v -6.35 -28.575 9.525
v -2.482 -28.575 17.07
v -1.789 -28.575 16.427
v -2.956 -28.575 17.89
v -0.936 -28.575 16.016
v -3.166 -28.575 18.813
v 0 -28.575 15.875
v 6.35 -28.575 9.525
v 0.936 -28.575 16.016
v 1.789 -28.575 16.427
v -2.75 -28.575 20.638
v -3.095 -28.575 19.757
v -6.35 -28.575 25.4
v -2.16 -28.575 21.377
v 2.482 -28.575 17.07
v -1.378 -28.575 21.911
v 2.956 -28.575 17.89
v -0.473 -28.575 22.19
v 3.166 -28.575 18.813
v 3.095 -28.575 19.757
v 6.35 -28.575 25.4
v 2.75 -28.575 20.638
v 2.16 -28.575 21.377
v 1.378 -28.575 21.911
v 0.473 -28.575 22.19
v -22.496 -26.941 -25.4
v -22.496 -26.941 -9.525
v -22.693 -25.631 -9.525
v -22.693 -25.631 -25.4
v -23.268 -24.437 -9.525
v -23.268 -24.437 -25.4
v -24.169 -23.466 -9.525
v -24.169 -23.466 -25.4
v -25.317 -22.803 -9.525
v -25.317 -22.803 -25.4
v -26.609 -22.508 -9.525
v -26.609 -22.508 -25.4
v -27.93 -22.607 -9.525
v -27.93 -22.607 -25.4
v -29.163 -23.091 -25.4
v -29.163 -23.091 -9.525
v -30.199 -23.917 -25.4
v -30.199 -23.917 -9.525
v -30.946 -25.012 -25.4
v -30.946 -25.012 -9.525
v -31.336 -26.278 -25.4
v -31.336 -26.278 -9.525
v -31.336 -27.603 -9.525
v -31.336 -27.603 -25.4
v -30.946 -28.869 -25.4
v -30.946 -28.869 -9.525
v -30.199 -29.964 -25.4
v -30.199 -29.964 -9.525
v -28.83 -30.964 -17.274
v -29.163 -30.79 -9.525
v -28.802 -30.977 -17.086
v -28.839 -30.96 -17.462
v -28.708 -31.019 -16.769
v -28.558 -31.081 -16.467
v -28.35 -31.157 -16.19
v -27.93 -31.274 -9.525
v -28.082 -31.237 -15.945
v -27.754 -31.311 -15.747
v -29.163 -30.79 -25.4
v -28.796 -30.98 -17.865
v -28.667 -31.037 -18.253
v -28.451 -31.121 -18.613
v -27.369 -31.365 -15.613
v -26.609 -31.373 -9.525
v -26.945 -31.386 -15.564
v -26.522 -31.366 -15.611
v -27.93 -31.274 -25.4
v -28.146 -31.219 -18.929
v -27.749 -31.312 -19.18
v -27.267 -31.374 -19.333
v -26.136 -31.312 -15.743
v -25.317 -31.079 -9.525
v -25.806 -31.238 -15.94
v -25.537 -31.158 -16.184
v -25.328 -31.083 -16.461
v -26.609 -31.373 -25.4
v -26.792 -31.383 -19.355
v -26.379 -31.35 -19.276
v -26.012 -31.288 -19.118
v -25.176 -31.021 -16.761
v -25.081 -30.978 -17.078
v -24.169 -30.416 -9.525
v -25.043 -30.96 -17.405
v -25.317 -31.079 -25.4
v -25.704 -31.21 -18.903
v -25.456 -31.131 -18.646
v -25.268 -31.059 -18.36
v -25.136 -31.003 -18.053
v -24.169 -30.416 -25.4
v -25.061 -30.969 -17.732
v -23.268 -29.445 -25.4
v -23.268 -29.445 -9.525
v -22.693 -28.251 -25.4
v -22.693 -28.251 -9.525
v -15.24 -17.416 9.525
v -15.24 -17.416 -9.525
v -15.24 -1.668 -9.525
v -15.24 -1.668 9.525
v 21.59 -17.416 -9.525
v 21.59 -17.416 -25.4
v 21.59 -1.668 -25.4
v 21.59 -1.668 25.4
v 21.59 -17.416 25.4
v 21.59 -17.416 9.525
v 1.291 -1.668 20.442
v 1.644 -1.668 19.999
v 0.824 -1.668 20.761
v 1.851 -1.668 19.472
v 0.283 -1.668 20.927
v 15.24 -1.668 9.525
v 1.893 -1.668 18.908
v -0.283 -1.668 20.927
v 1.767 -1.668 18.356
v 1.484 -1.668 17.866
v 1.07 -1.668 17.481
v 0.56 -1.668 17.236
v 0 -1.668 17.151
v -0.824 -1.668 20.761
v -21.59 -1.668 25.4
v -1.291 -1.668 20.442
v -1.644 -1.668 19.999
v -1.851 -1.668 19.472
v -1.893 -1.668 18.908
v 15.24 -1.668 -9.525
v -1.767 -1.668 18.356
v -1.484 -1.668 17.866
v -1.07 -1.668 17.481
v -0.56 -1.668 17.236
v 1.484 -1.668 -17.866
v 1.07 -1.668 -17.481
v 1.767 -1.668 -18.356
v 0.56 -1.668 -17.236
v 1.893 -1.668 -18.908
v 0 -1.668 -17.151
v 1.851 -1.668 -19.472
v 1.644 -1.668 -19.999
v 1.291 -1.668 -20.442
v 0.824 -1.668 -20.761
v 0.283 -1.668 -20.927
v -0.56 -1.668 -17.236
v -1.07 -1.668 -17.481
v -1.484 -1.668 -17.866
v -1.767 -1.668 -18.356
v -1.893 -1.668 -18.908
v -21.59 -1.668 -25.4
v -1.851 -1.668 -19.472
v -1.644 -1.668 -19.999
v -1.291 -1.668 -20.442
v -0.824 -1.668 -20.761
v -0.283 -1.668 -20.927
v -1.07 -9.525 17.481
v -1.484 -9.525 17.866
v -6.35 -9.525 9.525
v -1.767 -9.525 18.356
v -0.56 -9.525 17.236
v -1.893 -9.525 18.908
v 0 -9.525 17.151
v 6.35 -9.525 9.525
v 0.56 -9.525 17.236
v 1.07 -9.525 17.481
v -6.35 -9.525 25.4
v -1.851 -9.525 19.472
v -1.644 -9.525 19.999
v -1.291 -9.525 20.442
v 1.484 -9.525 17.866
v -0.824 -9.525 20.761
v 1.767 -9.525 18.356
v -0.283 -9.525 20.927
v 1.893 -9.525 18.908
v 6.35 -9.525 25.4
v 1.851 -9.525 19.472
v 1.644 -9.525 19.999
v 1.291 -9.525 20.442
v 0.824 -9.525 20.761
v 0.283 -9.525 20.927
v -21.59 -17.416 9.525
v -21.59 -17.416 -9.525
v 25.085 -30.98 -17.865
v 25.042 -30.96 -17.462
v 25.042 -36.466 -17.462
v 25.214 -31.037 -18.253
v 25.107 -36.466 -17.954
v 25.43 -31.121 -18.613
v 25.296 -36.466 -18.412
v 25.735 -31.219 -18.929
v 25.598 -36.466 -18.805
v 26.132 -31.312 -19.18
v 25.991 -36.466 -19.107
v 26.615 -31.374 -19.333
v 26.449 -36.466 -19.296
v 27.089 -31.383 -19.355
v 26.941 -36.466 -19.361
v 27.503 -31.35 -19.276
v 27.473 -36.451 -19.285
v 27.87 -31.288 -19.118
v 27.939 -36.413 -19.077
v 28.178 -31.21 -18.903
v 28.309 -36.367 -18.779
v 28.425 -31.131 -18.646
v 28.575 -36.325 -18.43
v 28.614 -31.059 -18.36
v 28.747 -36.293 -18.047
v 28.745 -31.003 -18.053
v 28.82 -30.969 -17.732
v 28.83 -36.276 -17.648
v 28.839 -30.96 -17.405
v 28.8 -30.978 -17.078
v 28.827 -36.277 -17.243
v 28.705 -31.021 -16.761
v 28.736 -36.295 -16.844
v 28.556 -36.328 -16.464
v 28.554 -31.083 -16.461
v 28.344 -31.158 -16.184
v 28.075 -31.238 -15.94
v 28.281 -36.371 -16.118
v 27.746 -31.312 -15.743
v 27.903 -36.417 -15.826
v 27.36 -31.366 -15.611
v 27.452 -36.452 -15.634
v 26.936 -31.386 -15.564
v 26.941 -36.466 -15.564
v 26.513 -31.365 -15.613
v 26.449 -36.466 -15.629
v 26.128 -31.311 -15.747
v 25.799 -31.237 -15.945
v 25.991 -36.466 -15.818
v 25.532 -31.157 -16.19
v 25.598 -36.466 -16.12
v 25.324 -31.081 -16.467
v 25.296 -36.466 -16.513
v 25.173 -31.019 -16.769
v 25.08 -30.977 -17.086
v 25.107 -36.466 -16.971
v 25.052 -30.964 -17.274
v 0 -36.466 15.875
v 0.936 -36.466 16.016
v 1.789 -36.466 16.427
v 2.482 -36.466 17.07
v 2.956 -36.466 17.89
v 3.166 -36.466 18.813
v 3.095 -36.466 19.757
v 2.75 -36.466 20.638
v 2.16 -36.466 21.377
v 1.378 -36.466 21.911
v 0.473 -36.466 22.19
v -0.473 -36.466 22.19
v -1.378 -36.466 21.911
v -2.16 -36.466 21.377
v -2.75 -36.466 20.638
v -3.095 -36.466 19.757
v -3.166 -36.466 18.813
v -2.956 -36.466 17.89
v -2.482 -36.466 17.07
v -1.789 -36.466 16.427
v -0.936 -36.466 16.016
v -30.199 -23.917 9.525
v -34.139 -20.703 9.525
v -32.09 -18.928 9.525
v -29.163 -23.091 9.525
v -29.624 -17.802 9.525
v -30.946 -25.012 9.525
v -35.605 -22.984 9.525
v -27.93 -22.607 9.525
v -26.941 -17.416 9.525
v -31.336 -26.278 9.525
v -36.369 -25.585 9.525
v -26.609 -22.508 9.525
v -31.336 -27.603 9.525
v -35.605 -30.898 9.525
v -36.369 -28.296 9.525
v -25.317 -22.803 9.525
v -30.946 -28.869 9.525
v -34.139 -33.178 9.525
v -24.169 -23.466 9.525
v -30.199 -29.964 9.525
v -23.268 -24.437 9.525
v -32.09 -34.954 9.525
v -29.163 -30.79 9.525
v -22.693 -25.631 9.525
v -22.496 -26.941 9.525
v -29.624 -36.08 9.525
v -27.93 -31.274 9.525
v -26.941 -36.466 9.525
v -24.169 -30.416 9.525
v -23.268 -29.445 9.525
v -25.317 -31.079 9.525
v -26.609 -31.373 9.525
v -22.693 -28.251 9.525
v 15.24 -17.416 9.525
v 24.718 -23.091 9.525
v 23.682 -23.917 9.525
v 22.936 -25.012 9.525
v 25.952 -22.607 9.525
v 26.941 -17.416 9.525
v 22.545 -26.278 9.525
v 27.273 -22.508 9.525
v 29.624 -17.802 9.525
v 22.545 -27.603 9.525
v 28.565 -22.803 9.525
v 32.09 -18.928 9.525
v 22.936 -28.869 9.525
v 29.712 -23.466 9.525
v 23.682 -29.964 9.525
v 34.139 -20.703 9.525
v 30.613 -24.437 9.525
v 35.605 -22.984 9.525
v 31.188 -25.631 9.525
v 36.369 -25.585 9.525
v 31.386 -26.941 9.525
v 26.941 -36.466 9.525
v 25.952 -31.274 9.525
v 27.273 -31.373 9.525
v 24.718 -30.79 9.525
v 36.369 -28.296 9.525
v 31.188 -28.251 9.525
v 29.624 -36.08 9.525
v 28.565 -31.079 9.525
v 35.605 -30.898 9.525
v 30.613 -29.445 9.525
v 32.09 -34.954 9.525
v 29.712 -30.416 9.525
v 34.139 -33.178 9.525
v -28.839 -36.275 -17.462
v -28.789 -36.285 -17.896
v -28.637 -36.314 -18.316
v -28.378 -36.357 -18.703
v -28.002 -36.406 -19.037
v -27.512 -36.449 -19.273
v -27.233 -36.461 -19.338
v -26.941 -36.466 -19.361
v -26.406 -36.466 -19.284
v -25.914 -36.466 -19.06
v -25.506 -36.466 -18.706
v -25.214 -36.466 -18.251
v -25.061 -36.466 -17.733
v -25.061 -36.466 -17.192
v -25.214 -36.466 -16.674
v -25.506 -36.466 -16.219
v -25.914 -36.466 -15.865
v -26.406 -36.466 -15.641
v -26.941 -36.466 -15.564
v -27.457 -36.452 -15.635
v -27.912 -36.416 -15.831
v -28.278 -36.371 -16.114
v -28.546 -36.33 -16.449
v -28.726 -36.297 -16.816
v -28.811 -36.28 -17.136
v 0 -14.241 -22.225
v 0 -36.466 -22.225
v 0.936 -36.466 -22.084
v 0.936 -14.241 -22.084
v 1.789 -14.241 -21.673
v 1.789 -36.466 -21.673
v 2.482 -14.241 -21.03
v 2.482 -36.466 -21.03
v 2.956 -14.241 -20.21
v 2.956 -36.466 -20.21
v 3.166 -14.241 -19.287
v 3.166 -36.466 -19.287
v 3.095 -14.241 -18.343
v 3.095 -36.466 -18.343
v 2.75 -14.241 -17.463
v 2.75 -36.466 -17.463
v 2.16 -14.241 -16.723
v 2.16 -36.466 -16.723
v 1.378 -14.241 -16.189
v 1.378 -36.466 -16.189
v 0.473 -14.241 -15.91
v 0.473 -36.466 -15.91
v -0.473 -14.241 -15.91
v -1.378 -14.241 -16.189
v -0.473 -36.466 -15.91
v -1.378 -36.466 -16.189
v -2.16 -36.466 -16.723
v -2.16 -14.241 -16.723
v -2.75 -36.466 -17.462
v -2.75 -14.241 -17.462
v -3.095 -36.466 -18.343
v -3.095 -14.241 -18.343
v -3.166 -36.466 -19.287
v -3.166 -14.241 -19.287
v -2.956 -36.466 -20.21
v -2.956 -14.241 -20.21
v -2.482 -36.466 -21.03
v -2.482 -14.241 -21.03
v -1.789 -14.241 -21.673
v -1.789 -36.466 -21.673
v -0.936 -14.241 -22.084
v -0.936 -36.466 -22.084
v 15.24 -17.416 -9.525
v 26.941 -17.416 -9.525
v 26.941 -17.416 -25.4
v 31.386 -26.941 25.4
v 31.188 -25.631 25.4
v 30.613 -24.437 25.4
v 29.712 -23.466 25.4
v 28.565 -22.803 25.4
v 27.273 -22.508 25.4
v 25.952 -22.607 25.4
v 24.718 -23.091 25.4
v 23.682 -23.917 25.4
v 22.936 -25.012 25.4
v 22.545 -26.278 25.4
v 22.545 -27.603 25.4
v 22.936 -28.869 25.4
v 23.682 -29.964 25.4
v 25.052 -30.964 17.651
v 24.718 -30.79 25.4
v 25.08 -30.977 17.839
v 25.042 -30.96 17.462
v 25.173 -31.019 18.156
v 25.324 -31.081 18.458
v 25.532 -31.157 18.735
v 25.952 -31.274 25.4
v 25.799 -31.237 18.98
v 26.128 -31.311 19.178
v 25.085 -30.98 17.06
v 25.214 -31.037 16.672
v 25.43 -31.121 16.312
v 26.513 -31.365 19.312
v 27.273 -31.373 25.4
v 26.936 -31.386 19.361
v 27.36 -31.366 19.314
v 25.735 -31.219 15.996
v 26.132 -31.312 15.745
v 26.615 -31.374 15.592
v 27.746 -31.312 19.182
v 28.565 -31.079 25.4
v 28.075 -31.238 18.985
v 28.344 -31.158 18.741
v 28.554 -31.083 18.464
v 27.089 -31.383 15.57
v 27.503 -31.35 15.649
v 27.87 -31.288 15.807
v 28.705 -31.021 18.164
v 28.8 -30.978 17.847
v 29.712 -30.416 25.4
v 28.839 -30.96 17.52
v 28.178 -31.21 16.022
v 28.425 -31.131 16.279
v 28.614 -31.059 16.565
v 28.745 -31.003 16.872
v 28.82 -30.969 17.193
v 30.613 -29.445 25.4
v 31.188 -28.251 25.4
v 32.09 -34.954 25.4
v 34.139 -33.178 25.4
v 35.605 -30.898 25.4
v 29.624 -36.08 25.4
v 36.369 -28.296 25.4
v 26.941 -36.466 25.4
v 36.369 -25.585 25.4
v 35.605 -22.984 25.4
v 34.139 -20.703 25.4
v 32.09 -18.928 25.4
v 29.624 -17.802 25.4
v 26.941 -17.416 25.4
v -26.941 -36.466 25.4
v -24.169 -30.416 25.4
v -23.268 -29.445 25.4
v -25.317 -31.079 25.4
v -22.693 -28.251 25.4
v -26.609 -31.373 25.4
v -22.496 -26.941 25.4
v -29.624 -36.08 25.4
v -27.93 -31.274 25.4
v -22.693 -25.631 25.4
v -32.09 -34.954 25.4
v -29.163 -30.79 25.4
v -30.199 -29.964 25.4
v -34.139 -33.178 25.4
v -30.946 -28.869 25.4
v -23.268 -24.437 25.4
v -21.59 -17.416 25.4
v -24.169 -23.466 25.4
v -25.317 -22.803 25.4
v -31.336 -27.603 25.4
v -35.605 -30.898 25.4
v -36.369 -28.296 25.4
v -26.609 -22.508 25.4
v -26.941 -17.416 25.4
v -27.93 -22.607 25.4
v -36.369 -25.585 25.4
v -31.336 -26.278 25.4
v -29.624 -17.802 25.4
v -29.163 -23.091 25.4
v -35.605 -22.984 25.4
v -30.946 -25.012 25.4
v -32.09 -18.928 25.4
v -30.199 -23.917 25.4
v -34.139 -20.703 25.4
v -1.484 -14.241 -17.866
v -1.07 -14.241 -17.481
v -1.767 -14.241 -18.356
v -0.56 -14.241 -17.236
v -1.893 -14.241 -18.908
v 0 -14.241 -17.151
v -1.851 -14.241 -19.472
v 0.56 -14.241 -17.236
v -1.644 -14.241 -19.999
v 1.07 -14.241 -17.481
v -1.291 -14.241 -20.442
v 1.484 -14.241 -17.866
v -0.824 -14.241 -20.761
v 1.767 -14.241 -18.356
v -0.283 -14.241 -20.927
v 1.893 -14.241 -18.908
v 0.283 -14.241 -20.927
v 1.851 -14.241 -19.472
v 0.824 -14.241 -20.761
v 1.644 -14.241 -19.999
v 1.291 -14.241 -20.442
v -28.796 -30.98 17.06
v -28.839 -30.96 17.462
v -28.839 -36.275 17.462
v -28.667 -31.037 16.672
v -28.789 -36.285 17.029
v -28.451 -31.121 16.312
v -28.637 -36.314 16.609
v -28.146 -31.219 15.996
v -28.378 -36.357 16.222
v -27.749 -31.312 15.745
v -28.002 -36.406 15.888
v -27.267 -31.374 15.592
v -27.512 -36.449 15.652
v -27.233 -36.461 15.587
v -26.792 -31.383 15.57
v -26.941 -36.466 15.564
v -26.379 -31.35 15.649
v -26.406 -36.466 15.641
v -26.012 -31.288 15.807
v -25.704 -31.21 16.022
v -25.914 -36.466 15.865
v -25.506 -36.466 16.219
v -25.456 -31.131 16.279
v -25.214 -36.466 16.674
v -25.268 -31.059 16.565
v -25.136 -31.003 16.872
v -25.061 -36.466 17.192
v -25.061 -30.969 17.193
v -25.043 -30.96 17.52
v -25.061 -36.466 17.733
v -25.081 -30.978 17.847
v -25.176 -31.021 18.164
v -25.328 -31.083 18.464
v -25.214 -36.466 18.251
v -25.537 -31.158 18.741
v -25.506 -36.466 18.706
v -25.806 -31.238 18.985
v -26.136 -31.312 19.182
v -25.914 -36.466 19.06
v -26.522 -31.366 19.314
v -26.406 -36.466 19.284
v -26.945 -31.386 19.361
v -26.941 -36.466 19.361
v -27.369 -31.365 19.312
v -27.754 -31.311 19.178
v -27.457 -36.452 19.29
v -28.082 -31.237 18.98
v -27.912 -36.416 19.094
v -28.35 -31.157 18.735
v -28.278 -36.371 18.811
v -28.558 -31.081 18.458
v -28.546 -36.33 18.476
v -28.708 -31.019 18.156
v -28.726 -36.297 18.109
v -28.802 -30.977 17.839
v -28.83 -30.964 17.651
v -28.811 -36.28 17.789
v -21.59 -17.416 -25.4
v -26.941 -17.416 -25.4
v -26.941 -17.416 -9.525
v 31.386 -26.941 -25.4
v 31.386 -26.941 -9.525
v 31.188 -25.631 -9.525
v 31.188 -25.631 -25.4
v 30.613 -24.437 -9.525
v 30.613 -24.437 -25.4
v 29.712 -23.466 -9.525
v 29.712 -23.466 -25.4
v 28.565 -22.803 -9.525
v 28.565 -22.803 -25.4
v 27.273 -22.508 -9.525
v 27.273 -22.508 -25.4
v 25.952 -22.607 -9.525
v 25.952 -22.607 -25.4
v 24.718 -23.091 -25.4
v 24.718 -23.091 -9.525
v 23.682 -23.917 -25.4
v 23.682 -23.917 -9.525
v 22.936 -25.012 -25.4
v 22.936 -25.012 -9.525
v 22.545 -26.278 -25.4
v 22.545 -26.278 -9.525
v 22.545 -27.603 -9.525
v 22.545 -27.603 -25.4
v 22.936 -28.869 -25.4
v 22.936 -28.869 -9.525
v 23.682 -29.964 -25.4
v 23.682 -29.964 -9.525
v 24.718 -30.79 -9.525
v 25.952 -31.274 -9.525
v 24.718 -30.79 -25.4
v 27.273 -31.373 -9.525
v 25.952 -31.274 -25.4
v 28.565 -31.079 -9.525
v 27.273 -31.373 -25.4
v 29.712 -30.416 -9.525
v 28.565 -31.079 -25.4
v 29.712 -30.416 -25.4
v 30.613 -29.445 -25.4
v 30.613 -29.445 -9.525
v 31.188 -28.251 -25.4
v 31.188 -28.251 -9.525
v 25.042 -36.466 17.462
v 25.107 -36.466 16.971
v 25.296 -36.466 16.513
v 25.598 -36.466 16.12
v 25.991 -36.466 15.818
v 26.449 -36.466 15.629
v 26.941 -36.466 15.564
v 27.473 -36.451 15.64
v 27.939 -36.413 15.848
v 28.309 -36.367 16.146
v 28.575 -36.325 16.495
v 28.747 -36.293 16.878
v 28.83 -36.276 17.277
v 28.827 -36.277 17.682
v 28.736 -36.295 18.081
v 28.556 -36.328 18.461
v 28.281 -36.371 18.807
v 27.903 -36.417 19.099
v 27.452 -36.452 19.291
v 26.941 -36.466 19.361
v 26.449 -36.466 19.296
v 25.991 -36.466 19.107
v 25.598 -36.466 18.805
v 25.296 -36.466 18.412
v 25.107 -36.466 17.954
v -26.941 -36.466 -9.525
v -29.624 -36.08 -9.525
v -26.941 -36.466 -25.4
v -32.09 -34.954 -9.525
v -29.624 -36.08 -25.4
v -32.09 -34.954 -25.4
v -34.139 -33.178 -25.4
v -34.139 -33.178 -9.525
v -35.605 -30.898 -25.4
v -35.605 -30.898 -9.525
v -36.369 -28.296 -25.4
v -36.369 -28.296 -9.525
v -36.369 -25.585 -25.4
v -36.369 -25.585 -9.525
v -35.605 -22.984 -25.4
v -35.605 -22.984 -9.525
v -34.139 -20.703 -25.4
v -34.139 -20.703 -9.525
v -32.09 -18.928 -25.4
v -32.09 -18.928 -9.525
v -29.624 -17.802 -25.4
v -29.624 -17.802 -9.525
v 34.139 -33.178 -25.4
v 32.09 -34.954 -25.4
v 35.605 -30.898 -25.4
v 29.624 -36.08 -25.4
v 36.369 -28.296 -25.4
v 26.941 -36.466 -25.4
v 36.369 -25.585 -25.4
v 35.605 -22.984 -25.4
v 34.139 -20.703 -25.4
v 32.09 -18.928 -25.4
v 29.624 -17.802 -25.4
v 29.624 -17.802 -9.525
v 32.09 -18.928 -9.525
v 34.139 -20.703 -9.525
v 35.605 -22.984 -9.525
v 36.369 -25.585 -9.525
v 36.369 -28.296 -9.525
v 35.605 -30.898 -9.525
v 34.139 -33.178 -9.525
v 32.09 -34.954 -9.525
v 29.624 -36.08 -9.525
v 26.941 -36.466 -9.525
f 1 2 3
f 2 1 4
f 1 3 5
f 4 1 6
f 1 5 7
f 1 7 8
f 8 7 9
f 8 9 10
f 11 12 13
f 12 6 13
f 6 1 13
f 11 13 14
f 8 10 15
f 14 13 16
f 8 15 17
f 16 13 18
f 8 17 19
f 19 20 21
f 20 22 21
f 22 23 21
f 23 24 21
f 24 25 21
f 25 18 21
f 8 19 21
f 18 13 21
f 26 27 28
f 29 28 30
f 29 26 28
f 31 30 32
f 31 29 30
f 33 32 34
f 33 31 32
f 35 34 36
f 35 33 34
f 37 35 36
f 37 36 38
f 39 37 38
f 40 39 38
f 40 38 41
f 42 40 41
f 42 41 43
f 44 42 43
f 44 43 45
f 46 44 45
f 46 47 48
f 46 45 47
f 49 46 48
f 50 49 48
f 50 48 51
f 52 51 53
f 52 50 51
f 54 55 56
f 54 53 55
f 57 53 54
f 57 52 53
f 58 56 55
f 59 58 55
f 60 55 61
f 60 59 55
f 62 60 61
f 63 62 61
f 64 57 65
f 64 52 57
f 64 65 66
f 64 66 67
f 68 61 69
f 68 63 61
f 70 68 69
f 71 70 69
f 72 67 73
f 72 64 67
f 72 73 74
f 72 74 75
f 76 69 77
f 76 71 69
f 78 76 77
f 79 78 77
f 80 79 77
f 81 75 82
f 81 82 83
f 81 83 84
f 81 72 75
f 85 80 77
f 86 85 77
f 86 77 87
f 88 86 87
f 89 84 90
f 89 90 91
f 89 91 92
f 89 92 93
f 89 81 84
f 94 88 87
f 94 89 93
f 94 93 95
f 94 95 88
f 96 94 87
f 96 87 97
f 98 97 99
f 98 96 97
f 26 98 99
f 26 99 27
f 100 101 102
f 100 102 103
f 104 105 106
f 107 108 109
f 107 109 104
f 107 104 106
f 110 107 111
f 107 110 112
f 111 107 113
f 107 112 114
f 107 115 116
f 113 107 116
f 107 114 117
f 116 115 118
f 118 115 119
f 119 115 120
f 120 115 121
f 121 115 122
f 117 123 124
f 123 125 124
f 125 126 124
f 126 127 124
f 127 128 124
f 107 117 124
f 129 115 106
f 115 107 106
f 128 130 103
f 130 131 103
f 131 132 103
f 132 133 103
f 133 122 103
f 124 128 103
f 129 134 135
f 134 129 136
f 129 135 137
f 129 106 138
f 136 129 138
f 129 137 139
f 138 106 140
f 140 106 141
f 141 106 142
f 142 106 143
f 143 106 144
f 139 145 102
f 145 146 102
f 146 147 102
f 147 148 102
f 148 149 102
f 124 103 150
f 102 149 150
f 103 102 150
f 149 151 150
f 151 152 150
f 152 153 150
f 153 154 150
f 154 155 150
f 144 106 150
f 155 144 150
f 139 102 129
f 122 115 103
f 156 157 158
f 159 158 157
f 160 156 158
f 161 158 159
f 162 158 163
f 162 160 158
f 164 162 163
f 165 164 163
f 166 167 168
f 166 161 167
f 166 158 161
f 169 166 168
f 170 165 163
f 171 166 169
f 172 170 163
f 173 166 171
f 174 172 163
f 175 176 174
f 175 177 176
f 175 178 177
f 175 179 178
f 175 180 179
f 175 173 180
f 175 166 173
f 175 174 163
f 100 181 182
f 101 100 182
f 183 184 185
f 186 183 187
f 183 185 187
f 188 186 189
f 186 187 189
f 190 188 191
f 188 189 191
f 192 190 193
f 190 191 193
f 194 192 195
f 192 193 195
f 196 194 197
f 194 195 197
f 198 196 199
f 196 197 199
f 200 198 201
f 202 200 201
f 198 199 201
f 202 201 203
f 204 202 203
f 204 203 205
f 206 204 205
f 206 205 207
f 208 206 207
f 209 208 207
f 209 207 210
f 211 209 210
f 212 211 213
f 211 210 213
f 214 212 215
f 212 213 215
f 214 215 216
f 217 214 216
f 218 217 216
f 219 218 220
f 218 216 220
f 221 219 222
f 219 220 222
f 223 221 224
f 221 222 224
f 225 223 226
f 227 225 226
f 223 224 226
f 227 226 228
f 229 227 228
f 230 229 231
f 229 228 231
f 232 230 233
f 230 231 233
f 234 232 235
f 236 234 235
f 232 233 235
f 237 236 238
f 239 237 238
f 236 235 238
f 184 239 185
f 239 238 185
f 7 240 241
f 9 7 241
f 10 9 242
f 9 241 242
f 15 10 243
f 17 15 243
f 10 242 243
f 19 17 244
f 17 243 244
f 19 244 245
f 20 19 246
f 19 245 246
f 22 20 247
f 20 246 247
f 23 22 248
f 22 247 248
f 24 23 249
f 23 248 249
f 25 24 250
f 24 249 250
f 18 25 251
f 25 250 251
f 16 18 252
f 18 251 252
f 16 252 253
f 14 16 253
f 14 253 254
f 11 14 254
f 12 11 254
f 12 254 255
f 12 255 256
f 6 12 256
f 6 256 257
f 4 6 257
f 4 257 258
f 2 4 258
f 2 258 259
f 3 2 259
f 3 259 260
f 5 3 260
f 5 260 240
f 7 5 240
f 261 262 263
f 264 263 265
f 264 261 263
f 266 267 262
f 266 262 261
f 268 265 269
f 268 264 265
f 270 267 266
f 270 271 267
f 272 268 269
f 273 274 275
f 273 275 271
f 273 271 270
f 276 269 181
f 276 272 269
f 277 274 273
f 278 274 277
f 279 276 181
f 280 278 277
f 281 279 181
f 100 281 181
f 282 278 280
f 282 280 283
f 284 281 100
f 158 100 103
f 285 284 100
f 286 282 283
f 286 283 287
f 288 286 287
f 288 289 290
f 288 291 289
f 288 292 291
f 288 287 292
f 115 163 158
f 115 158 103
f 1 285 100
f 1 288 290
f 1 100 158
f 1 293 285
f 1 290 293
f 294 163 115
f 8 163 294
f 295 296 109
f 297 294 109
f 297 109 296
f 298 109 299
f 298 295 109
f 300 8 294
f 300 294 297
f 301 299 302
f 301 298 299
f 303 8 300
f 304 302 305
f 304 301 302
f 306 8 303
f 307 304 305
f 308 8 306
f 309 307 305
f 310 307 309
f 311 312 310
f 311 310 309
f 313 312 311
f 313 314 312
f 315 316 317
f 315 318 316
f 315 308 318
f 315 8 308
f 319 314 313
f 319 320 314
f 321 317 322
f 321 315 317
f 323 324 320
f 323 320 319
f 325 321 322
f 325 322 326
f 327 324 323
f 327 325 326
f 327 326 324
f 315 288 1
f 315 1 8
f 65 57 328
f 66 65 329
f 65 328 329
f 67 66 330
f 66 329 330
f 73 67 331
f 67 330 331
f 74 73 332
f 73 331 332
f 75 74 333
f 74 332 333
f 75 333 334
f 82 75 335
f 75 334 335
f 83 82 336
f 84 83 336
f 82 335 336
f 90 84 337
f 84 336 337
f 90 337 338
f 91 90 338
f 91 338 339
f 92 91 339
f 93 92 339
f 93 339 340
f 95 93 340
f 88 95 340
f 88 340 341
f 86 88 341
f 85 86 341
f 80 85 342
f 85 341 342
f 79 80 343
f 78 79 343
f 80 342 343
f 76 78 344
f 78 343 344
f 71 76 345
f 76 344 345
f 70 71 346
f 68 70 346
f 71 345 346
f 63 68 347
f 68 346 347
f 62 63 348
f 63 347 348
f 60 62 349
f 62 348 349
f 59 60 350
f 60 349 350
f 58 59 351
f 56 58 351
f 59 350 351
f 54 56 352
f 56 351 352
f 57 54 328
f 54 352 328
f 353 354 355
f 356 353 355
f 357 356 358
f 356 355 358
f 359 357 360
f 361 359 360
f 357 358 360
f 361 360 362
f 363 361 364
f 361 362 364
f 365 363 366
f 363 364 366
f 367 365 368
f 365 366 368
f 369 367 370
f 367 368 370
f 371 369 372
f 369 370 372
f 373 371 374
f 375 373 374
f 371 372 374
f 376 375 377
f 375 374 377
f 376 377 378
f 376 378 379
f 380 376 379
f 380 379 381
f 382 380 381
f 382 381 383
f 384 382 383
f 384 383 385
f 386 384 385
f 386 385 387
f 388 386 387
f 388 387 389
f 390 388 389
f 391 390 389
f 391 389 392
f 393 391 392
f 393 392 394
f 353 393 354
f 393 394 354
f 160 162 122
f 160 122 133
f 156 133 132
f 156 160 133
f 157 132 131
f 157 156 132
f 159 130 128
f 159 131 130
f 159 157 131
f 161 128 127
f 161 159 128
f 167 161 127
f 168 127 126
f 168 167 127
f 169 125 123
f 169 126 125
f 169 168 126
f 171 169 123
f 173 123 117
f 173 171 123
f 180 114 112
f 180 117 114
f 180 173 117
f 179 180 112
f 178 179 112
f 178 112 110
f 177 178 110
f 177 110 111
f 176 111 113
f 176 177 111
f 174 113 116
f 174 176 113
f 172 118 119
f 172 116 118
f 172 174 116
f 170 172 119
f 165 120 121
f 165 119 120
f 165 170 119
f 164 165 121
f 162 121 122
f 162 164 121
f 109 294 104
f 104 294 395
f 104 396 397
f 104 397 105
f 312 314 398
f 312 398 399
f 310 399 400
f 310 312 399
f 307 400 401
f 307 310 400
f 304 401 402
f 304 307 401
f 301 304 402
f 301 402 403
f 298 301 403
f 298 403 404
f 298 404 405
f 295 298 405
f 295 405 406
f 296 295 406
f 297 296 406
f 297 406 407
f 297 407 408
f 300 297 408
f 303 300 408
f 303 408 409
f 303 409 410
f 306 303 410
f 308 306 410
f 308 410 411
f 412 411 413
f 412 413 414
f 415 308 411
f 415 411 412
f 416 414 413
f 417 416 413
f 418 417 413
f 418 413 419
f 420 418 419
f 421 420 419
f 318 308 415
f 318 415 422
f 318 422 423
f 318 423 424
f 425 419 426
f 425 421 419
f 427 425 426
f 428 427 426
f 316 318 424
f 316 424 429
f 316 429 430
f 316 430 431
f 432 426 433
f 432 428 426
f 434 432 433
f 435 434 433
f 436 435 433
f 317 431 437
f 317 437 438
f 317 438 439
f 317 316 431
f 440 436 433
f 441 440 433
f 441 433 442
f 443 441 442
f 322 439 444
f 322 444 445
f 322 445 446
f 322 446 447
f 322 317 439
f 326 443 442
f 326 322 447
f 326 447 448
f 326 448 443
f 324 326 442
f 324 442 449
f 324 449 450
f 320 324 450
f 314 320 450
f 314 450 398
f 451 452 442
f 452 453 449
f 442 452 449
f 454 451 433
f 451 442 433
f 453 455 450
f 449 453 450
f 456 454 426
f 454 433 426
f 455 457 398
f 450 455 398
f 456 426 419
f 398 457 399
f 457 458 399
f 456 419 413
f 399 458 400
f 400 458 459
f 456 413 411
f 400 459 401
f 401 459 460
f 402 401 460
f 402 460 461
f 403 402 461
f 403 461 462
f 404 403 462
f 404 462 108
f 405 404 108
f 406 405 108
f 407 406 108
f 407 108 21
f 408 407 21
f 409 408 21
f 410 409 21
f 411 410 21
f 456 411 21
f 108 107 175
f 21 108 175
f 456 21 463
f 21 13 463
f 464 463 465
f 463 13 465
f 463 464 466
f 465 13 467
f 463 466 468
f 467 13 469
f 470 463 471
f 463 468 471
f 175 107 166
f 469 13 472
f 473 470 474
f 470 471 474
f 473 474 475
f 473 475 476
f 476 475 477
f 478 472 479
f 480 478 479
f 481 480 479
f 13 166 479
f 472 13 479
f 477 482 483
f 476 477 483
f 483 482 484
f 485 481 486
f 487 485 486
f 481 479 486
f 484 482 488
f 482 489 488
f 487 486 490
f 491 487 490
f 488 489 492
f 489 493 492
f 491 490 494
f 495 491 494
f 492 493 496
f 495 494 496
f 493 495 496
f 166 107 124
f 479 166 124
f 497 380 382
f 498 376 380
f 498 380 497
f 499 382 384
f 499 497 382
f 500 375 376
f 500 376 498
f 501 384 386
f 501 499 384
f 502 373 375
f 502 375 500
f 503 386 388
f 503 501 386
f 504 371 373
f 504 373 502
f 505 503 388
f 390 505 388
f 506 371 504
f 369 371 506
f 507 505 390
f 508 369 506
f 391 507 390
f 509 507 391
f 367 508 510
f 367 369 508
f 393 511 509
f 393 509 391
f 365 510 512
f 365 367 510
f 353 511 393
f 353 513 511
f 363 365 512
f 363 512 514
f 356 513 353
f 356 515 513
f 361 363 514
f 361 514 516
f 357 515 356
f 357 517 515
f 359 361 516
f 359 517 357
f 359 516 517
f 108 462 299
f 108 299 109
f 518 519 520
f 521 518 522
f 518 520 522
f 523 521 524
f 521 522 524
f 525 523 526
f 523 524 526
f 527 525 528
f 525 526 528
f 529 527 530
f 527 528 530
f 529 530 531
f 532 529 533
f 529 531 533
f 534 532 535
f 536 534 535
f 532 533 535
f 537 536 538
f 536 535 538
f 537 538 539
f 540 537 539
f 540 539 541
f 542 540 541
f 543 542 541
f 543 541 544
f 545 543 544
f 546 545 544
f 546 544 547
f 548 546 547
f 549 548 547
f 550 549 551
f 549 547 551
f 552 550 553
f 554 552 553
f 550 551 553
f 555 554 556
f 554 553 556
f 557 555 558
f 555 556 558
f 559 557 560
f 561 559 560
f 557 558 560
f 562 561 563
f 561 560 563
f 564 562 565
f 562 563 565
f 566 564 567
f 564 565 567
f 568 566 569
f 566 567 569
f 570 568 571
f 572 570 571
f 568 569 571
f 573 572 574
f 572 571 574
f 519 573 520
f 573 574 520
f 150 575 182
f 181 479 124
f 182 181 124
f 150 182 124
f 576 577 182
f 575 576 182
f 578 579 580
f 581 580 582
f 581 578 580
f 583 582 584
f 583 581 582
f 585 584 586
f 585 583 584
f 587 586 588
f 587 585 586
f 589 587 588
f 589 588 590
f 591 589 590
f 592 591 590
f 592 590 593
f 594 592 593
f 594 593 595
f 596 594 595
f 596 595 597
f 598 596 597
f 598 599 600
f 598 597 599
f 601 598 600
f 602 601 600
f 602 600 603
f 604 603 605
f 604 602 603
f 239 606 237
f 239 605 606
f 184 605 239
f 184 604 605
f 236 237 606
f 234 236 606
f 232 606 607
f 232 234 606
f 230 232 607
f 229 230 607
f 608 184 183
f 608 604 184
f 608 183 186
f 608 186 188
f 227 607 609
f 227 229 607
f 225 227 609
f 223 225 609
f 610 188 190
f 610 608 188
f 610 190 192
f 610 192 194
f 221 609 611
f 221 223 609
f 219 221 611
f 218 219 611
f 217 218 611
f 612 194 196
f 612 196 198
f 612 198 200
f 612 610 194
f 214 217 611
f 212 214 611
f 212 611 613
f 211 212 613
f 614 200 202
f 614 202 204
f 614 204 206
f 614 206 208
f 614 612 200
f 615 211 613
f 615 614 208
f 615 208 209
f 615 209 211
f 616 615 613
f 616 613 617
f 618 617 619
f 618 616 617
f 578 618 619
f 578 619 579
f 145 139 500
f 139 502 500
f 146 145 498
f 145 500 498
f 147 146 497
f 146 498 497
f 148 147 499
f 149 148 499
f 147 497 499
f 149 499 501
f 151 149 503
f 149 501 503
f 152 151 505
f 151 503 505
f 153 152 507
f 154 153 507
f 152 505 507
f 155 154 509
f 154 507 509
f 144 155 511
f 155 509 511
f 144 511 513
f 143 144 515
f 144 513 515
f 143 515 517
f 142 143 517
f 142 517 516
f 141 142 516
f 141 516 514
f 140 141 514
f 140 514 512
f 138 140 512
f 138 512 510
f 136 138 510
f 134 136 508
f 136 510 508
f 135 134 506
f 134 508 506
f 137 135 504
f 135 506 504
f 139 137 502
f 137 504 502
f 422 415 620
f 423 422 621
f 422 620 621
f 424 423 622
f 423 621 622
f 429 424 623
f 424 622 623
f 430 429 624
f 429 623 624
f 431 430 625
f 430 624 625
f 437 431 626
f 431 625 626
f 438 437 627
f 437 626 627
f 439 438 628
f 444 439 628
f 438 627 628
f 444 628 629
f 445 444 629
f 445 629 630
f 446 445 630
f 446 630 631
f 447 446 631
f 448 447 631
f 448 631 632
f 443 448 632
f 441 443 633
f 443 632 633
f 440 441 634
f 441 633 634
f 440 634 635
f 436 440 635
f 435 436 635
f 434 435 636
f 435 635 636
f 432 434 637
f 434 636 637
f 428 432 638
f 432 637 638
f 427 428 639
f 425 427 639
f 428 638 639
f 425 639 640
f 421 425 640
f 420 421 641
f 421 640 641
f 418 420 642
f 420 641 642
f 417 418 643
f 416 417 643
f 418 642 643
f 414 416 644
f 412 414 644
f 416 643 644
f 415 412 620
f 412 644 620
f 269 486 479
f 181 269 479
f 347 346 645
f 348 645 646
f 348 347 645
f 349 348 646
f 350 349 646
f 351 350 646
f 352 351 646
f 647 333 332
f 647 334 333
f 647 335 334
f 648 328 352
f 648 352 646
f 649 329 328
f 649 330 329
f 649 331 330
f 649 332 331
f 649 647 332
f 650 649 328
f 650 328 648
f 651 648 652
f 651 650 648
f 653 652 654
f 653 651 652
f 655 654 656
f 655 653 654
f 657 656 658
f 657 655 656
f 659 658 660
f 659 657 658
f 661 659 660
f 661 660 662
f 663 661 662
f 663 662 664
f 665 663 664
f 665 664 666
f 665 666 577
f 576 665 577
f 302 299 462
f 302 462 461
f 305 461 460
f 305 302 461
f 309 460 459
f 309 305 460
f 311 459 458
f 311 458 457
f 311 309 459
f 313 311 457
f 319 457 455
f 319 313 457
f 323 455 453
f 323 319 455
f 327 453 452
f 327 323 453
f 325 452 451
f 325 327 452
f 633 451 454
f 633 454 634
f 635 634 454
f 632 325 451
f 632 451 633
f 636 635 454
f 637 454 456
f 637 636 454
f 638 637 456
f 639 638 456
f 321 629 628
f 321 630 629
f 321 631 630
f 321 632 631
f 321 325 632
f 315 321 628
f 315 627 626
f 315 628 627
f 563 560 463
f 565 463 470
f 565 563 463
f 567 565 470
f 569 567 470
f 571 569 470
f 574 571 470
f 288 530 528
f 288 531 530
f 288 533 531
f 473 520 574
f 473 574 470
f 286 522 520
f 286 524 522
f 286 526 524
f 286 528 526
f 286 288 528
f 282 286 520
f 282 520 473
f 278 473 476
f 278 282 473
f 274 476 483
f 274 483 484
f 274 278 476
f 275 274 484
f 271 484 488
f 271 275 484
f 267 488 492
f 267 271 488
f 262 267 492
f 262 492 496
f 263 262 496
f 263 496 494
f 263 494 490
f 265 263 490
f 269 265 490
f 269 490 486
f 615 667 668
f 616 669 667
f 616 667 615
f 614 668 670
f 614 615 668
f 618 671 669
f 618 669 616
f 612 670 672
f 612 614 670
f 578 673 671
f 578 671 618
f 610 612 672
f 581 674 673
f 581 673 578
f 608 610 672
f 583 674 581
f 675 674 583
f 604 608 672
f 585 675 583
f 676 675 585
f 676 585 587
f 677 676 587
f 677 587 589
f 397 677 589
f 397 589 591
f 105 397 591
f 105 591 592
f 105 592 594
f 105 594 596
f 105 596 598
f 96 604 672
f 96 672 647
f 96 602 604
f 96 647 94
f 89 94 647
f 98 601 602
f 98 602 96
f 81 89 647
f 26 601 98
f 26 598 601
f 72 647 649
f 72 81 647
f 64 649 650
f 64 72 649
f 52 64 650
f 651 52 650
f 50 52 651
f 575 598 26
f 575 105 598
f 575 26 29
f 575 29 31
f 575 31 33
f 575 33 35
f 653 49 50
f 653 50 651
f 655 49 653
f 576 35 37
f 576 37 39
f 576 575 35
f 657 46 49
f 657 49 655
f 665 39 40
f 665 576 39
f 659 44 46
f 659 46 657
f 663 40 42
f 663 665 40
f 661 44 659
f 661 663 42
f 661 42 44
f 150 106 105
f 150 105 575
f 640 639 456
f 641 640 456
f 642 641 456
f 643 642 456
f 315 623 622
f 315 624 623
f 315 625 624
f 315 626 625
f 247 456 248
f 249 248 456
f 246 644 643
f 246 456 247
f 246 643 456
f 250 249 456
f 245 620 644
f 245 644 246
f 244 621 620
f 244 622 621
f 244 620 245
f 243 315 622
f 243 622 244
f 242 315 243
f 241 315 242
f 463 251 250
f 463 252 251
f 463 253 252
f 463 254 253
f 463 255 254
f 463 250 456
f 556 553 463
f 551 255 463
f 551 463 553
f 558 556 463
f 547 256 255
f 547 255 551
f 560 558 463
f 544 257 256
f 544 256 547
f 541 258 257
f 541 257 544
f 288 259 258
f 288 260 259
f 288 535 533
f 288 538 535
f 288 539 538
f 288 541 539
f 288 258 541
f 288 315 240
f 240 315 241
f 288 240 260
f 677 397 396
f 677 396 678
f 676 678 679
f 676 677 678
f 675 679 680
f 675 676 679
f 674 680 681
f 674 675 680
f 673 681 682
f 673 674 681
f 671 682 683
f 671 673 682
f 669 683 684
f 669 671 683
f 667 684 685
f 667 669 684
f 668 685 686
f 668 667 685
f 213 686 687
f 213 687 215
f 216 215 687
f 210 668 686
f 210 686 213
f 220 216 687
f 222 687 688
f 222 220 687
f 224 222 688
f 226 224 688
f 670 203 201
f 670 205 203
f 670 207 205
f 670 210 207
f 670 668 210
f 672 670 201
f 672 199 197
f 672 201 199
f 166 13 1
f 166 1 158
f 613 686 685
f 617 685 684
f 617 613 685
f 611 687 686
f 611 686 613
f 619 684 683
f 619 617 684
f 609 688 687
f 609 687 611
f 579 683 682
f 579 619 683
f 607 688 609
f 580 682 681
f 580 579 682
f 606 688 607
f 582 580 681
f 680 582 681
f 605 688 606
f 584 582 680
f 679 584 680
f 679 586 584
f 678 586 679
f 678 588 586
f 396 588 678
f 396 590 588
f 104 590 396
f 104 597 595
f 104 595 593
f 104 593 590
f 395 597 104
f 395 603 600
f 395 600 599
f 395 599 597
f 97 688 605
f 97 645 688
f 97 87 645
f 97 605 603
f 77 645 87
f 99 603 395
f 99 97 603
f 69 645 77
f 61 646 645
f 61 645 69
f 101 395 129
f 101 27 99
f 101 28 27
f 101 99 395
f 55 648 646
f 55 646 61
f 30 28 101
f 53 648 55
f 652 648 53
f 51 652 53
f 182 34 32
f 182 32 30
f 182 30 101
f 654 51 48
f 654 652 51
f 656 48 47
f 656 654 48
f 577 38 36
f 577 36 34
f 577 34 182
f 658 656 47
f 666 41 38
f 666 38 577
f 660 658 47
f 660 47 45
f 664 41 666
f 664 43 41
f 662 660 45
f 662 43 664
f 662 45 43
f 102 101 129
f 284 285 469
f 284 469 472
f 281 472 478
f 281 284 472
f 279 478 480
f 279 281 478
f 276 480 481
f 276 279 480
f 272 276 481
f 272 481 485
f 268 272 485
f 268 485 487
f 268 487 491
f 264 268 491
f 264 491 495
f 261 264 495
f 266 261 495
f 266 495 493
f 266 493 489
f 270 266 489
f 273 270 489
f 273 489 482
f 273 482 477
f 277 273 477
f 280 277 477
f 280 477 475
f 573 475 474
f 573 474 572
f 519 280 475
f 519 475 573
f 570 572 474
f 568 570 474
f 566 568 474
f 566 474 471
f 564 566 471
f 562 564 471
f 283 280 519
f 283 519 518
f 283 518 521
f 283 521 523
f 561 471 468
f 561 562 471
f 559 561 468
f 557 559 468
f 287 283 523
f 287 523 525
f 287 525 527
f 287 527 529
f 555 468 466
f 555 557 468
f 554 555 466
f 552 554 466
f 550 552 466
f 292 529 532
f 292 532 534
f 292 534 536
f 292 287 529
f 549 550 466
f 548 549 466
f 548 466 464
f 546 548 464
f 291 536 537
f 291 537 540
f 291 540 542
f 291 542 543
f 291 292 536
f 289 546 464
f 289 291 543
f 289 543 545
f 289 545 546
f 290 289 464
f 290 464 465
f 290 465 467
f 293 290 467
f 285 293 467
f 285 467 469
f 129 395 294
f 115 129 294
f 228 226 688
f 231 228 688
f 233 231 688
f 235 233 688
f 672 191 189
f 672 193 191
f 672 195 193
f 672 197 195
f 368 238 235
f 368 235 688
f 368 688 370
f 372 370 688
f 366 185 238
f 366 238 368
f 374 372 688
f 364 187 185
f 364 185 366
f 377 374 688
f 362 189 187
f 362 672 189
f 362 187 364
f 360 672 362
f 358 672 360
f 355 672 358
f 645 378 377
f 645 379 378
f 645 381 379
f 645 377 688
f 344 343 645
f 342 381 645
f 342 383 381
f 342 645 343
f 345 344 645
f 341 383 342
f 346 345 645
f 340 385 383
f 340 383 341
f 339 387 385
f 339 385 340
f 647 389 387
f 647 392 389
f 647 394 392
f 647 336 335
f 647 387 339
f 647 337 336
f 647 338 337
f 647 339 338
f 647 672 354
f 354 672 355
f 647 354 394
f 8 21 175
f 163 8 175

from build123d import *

# Parameters (mm, degrees)
BOSS_EXTRUDE1_DEPTH               = 25.4
BOSS_EXTRUDE1_DEPTH_BACK          = 25.4
SKETCH1_R                         = 4.445
SKETCH9_W                         = 30.48
SKETCH9_H                         = 35.052
CUT_EXTRUDE6_DEPTH                = 75.08914513
BOSS_EXTRUDE3_DEPTH               = 12.7
SKETCH11_W                        = 5.350768363
SKETCH11_H                        = 57.15
CUT_EXTRUDE7_DEPTH                = 94.35417198
SKETCH12_W                        = 30.48
SKETCH12_H                        = 19.05
CUT_EXTRUDE8_DEPTH                = 93.670395825
SKETCH14_R                        = 1.6
CUT_EXTRUDE9_DEPTH                = 81.005571081
SKETCH15_R                        = 3.429
CUT_EXTRUDE10_DEPTH               = 81.005571081
CUT_EXTRUDE11_DEPTH               = 2.778125
SKETCH22_W                        = 1.89865
SKETCH22_H                        = 38.369875
SKETCH23_R                        = 3.175
CUT_EXTRUDE12_DEPTH               = 22.225
SKETCH24_W                        = 43.18
SKETCH24_H                        = 41.402
CUT_EXTRUDE13_DEPTH               = 94.35417198
CUT_EXTRUDE14_REACH               = 74.389
SKETCH25_W                        = 12.7
SKETCH25_H                        = 19.05
CUT_EXTRUDE15_DEPTH               = 74.112136493
CUT_EXTRUDE15_DEPTH_BACK          = 74.112136493
SKETCH26_W                        = 19.05
SKETCH26_H                        = 61.020370042
F_25_0_1495_DIAMETER_HOLE1_REACH  = 58.443
F_25_0_1495_DIAMETER_HOLE1_BORE_R = 1.89865


with BuildPart() as part:
    # Sketch1 → Boss-Extrude1 (new, two sides: drawn at the far end of the back side and taken through both)
    with BuildSketch(Plane.XY.offset(-BOSS_EXTRUDE1_DEPTH_BACK)):
        with BuildLine():
            Line((-26.940768363, -17.415768363), (-26.940768363, 39.734231637))
            Line((-26.940768363, 39.734231637), (26.940768363, 39.734231637))
            Line((26.940768363, 39.734231637), (26.940768363, -17.415768363))
            ThreePointArc((26.940768363, -17.415768363), (36.465768363, -26.940768363), (26.940768363, -36.465768363))
            Line((26.940768363, -36.465768363), (-26.940768363, -36.465768363))
            ThreePointArc((-26.940768363, -36.465768363), (-36.465768363, -26.940768363), (-26.940768363, -17.415768363))
        make_face()
        with Locations((-26.940768363, -26.940768363)):
            Circle(SKETCH1_R, mode=Mode.SUBTRACT)
        with Locations((26.940768363, -26.940768363)):
            Circle(SKETCH1_R, mode=Mode.SUBTRACT)
    extrude(amount=BOSS_EXTRUDE1_DEPTH + BOSS_EXTRUDE1_DEPTH_BACK)

    # Sketch9 → Cut-Extrude6 (cut, through all)
    with BuildSketch(Plane.XY.offset(25.4)):
        with Locations((0, 22.208231637)):
            Rectangle(SKETCH9_W, SKETCH9_H)
    extrude(amount=-CUT_EXTRUDE6_DEPTH, mode=Mode.SUBTRACT)

    # Sketch10 → Boss-Extrude3 (add)
    with BuildSketch(Plane.XY.offset(25.4)):
        Polygon((-26.940768363, 39.734231637), (-26.940768363, -1.667768363), (26.940768363, -1.667768363), (26.940768363, 39.734231637), (15.24, 39.734231637), (15.24, 4.682231637), (-15.24, 4.682231637), (-15.24, 39.734231637), align=None)
    boss_extrude3 = extrude(amount=BOSS_EXTRUDE3_DEPTH)

    # Mirror4: Boss-Extrude3 across plane
    add(boss_extrude3.mirror(Plane.XY))

    # Sketch11 → Cut-Extrude7 (cut, through all)
    with BuildSketch(Plane.XY.offset(38.1)):
        with Locations((-24.265384181, 11.159231637)):
            Rectangle(SKETCH11_W, SKETCH11_H)
    cut_extrude7 = extrude(amount=-CUT_EXTRUDE7_DEPTH, mode=Mode.SUBTRACT)

    # Mirror5: Cut-Extrude7 across plane
    add(cut_extrude7.mirror(Plane(origin=(0, 0, 0), x_dir=(0, 0, 1), z_dir=(1, 0, 0))), mode=Mode.SUBTRACT)

    # Sketch12 → Cut-Extrude8 (cut, through all)
    with BuildSketch(Plane.XZ.offset(36.465768363)):
        Rectangle(SKETCH12_W, SKETCH12_H)
    extrude(amount=-CUT_EXTRUDE8_DEPTH, mode=Mode.SUBTRACT)

    # Sketch14 → Cut-Extrude9 (cut, through all)
    with BuildSketch(Plane.ZY.offset(21.59)):
        with Locations(Location((-18.4, 22.462231637, 0), (0, 0, 90))):
            Circle(SKETCH14_R)
    cut_extrude9 = extrude(amount=-CUT_EXTRUDE9_DEPTH, mode=Mode.SUBTRACT)

    # Mirror6: Cut-Extrude9 across plane
    add(cut_extrude9.mirror(Plane.XY), mode=Mode.SUBTRACT)

    # Sketch15 → Cut-Extrude10 (cut, through all)
    with BuildSketch(Plane(origin=(21.59, 0, 0), x_dir=(0, 0, -1), z_dir=(1, 0, 0))):
        with Locations(Location((0, 22.462231637, 0), (0, 0, 90))):
            Circle(SKETCH15_R)
    extrude(amount=-CUT_EXTRUDE10_DEPTH, mode=Mode.SUBTRACT)

    # Sketch18 → Cut-Extrude11 (cut)
    with BuildSketch(Plane(origin=(0, 4.682231637, 0), x_dir=(1, 0, 0), z_dir=(0, 1, 0))):
        Polygon((-15.24, 2.346351494), (-19.304, 4.692702988), (-23.368, 2.346351494), (-23.368, -2.346351494), (-19.304, -4.692702988), (-15.24, -2.346351494), align=None)
    cut_extrude11 = extrude(amount=-CUT_EXTRUDE11_DEPTH, mode=Mode.SUBTRACT)

    # Mirror7: Cut-Extrude11 across plane
    add(cut_extrude11.mirror(Plane(origin=(0, 0, 0), x_dir=(0, 0, 1), z_dir=(1, 0, 0))), mode=Mode.SUBTRACT)

    # Sketch22 → #6 Clearance Hole1 (revolve, cut)
    with BuildSketch(Plane(origin=(0, 1.904106637, -19.05), x_dir=(0, 0, 1), z_dir=(1, 0, 0))):
        with Locations((0.949325, 19.1849375)):
            Rectangle(SKETCH22_W, SKETCH22_H)
    f_6_clearance_hole1 = revolve(axis=Axis((0, 8.254106637, -19.05), (0, -1, 0)), mode=Mode.SUBTRACT)

    # Mirror8: #6 Clearance Hole1 across plane
    add(f_6_clearance_hole1.mirror(Plane.XY), mode=Mode.SUBTRACT)

    # Sketch23 → Cut-Extrude12 (cut)
    with BuildSketch(Plane.XZ.offset(36.465768363)):
        with Locations(Location((0, -19.05, 0), (0, 0, 270))):
            Circle(SKETCH23_R)
        with Locations(Location((0, 19.05, 0), (0, 0, 270))):
            Circle(SKETCH23_R)
    extrude(amount=-CUT_EXTRUDE12_DEPTH, mode=Mode.SUBTRACT)

    # Sketch24 → Cut-Extrude13 (cut, through all)
    with BuildSketch(Plane(origin=(0, 0, -38.1), x_dir=(-1, 0, 0), z_dir=(0, 0, -1))):
        with Locations((0, 19.033231637)):
            Rectangle(SKETCH24_W, SKETCH24_H)
    extrude(amount=-CUT_EXTRUDE13_DEPTH, mode=Mode.SUBTRACT)

    # Sketch25 → Cut-Extrude14 (cut, up to next)
    with BuildSketch(Plane.XY.offset(25.4), mode=Mode.PRIVATE) as cut_extrude14_sk1:
        with Locations((0, -19.05)):
            Rectangle(SKETCH25_W, SKETCH25_H)
    cut_extrude14_tool1 = extrude(cut_extrude14_sk1.sketch, amount=-CUT_EXTRUDE14_REACH, mode=Mode.PRIVATE) & part.part
    add(cut_extrude14_tool1.solids().sort_by_distance((0, -19.05, 25.4))[0], mode=Mode.SUBTRACT)

    # Sketch26 → Cut-Extrude15 (cut, two sides: drawn at the far end of the back side and taken through both)
    with BuildSketch(Plane(origin=(21.59, 0, 0), x_dir=(0, 0, -1), z_dir=(1, 0, 0)).offset(-CUT_EXTRUDE15_DEPTH_BACK)):
        with Locations((0, -47.925953384)):
            Rectangle(SKETCH26_W, SKETCH26_H)
    extrude(amount=CUT_EXTRUDE15_DEPTH + CUT_EXTRUDE15_DEPTH_BACK, mode=Mode.SUBTRACT)

    # #25 (0.1495) Diameter Hole1 bore → #25 (0.1495) Diameter Hole1 (cut, up to next)
    with BuildSketch(Plane(origin=(0, -36.465768363, 0), x_dir=(-1, 0, 0), z_dir=(0, -1, 0)), mode=Mode.PRIVATE) as f_25_0_1495_diameter_hole1_sk1:
        with Locations((26.940768363, -17.4625)):
            Circle(F_25_0_1495_DIAMETER_HOLE1_BORE_R)
    f_25_0_1495_diameter_hole1_tool1 = extrude(f_25_0_1495_diameter_hole1_sk1.sketch, amount=-F_25_0_1495_DIAMETER_HOLE1_REACH, mode=Mode.PRIVATE) & part.part
    # #25 (0.1495) Diameter Hole1 bore → #25 (0.1495) Diameter Hole1 (cut, up to next)
    with BuildSketch(Plane(origin=(0, -36.465768363, 0), x_dir=(-1, 0, 0), z_dir=(0, -1, 0)), mode=Mode.PRIVATE) as f_25_0_1495_diameter_hole1_sk2:
        with Locations((26.940768363, 17.4625)):
            Circle(F_25_0_1495_DIAMETER_HOLE1_BORE_R)
    f_25_0_1495_diameter_hole1_tool2 = extrude(f_25_0_1495_diameter_hole1_sk2.sketch, amount=-F_25_0_1495_DIAMETER_HOLE1_REACH, mode=Mode.PRIVATE) & part.part
    # #25 (0.1495) Diameter Hole1 bore → #25 (0.1495) Diameter Hole1 (cut, up to next)
    with BuildSketch(Plane(origin=(0, -36.465768363, 0), x_dir=(-1, 0, 0), z_dir=(0, -1, 0)), mode=Mode.PRIVATE) as f_25_0_1495_diameter_hole1_sk3:
        with Locations((-26.940768363, 17.4625)):
            Circle(F_25_0_1495_DIAMETER_HOLE1_BORE_R)
    f_25_0_1495_diameter_hole1_tool3 = extrude(f_25_0_1495_diameter_hole1_sk3.sketch, amount=-F_25_0_1495_DIAMETER_HOLE1_REACH, mode=Mode.PRIVATE) & part.part
    # #25 (0.1495) Diameter Hole1 bore → #25 (0.1495) Diameter Hole1 (cut, up to next)
    with BuildSketch(Plane(origin=(0, -36.465768363, 0), x_dir=(-1, 0, 0), z_dir=(0, -1, 0)), mode=Mode.PRIVATE) as f_25_0_1495_diameter_hole1_sk4:
        with Locations((-26.940768363, -17.4625)):
            Circle(F_25_0_1495_DIAMETER_HOLE1_BORE_R)
    f_25_0_1495_diameter_hole1_tool4 = extrude(f_25_0_1495_diameter_hole1_sk4.sketch, amount=-F_25_0_1495_DIAMETER_HOLE1_REACH, mode=Mode.PRIVATE) & part.part
    add(f_25_0_1495_diameter_hole1_tool1.solids().sort_by_distance((-26.940768, -36.465768, 17.4625))[0], mode=Mode.SUBTRACT)
    add(f_25_0_1495_diameter_hole1_tool2.solids().sort_by_distance((-26.940768, -36.465768, -17.4625))[0], mode=Mode.SUBTRACT)
    add(f_25_0_1495_diameter_hole1_tool3.solids().sort_by_distance((26.940768, -36.465768, -17.4625))[0], mode=Mode.SUBTRACT)
    add(f_25_0_1495_diameter_hole1_tool4.solids().sort_by_distance((26.940768, -36.465768, 17.4625))[0], mode=Mode.SUBTRACT)


solid = part.part
